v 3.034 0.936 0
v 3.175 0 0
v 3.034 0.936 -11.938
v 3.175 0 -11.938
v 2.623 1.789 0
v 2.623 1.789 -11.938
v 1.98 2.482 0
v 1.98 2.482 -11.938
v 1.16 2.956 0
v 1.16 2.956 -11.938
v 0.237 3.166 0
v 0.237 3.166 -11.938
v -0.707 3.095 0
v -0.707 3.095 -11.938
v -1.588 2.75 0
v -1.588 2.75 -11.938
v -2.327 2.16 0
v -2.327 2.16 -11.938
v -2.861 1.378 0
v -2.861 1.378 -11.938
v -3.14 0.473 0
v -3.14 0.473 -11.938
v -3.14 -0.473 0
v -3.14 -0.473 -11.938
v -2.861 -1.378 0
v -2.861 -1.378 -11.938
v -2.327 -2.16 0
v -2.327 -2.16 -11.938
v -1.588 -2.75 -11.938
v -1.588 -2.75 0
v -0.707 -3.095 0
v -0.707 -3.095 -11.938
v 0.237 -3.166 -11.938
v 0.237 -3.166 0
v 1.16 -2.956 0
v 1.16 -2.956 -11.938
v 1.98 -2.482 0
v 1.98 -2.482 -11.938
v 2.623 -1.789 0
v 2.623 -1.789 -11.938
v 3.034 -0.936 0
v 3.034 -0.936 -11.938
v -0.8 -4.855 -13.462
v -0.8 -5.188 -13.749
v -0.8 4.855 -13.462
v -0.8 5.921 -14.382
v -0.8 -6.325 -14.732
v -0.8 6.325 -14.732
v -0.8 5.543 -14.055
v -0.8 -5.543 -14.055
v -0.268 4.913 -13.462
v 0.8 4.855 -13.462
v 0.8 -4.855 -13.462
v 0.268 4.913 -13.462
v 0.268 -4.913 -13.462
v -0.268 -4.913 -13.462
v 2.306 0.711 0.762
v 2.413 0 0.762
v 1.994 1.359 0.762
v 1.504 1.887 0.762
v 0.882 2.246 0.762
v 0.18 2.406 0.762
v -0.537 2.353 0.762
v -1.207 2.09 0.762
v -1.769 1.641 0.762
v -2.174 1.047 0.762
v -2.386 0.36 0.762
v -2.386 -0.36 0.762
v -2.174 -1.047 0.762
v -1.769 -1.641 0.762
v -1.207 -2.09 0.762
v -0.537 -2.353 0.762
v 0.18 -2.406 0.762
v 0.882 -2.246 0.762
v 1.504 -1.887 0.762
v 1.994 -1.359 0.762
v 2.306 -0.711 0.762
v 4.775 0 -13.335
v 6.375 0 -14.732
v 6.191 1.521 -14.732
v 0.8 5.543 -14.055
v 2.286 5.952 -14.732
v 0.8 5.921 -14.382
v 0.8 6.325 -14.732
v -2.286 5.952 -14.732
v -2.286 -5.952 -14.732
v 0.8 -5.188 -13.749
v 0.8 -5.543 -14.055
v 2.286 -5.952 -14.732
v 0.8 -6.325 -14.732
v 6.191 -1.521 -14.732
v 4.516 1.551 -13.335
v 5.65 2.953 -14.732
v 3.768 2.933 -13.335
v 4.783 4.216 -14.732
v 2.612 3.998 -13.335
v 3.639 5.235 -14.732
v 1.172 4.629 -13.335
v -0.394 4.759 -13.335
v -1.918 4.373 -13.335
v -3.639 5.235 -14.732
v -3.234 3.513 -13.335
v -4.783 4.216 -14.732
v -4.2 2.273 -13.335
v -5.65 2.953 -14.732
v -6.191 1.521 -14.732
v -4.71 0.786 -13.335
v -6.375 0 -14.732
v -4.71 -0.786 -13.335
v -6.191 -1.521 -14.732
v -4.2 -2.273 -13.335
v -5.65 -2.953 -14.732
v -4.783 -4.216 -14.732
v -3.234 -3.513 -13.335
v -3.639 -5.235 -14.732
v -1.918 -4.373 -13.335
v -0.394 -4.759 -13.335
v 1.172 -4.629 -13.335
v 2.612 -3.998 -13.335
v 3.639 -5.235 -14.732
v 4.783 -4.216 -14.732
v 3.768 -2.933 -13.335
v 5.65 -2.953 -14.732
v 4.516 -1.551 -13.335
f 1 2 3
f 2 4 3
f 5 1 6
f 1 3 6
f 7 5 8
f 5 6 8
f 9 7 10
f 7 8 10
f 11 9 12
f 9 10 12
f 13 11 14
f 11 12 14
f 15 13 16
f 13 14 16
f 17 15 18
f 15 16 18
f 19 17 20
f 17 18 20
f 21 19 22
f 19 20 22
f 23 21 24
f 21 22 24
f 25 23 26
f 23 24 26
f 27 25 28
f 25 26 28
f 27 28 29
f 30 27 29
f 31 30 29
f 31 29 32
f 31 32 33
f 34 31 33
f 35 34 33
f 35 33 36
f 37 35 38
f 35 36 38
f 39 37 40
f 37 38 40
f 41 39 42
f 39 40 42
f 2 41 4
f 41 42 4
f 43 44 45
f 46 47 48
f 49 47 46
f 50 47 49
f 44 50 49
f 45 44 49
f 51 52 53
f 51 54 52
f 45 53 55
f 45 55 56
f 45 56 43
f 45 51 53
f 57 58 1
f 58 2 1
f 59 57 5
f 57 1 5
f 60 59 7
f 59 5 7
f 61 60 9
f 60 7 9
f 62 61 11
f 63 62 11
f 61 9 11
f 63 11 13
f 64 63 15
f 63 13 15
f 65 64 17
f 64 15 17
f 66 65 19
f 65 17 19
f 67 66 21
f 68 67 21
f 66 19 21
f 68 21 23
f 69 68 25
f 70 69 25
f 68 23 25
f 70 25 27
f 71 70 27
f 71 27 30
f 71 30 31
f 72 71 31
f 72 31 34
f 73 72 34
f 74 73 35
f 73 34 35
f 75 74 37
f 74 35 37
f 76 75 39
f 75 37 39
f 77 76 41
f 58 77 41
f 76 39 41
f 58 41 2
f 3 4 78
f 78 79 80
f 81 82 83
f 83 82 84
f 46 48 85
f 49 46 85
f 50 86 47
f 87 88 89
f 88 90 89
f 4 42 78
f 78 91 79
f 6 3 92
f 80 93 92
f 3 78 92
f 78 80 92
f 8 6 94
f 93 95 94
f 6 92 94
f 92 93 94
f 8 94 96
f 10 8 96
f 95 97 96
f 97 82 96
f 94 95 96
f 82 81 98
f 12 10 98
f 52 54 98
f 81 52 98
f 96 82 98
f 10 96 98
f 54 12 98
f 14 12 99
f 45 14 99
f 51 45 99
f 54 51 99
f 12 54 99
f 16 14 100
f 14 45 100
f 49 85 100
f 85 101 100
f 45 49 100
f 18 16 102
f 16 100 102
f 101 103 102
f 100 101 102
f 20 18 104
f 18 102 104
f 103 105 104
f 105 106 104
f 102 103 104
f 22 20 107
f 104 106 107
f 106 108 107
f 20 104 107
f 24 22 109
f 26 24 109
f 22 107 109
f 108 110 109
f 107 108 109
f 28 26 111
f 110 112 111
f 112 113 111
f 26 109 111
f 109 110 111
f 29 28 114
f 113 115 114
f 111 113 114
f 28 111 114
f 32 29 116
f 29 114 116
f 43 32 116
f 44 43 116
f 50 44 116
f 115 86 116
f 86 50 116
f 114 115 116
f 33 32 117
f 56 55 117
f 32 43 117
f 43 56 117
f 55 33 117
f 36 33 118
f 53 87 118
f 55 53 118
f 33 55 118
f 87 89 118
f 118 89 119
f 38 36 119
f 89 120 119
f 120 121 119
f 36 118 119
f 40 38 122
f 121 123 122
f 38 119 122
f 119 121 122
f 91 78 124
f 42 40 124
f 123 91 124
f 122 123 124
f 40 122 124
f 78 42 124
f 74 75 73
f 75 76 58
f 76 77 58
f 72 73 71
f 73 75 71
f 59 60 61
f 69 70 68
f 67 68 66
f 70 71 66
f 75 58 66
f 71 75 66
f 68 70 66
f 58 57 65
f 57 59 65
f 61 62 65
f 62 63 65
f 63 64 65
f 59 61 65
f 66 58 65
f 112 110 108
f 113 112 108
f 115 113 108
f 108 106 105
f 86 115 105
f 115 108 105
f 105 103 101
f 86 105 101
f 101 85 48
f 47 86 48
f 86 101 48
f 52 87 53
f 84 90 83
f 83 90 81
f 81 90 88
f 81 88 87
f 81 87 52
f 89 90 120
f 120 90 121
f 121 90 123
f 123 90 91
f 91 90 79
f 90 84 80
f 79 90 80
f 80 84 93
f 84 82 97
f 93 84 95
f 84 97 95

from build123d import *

# Parameters (mm, degrees)
SKETCH6_W          = 1.6002
SKETCH6_H          = 14.426568413
CUT_EXTRUDE2_DEPTH = 1.27


with BuildPart() as part:
    # Sketch5 → Revolve2 (revolve)
    with BuildSketch(Plane(origin=(0, 0, 0), x_dir=(1, 0, 0), z_dir=(0, 1, 0))):
        Polygon((0, 14.732), (0, -0.762), (2.413, -0.762), (3.175, 0), (3.175, 11.938), (6.3754, 14.732), align=None)
    revolve(axis=Axis((0, 0, 0), (0, 0, 1)))

    # Sketch6 → Cut-Extrude2 (cut)
    with BuildSketch(Plane(origin=(0, 0, -14.732), x_dir=(-1, 0, 0), z_dir=(0, 0, -1))):
        with Locations((0, 0.400071831)):
            Rectangle(SKETCH6_W, SKETCH6_H)
    extrude(amount=-CUT_EXTRUDE2_DEPTH, mode=Mode.SUBTRACT)


solid = part.part
